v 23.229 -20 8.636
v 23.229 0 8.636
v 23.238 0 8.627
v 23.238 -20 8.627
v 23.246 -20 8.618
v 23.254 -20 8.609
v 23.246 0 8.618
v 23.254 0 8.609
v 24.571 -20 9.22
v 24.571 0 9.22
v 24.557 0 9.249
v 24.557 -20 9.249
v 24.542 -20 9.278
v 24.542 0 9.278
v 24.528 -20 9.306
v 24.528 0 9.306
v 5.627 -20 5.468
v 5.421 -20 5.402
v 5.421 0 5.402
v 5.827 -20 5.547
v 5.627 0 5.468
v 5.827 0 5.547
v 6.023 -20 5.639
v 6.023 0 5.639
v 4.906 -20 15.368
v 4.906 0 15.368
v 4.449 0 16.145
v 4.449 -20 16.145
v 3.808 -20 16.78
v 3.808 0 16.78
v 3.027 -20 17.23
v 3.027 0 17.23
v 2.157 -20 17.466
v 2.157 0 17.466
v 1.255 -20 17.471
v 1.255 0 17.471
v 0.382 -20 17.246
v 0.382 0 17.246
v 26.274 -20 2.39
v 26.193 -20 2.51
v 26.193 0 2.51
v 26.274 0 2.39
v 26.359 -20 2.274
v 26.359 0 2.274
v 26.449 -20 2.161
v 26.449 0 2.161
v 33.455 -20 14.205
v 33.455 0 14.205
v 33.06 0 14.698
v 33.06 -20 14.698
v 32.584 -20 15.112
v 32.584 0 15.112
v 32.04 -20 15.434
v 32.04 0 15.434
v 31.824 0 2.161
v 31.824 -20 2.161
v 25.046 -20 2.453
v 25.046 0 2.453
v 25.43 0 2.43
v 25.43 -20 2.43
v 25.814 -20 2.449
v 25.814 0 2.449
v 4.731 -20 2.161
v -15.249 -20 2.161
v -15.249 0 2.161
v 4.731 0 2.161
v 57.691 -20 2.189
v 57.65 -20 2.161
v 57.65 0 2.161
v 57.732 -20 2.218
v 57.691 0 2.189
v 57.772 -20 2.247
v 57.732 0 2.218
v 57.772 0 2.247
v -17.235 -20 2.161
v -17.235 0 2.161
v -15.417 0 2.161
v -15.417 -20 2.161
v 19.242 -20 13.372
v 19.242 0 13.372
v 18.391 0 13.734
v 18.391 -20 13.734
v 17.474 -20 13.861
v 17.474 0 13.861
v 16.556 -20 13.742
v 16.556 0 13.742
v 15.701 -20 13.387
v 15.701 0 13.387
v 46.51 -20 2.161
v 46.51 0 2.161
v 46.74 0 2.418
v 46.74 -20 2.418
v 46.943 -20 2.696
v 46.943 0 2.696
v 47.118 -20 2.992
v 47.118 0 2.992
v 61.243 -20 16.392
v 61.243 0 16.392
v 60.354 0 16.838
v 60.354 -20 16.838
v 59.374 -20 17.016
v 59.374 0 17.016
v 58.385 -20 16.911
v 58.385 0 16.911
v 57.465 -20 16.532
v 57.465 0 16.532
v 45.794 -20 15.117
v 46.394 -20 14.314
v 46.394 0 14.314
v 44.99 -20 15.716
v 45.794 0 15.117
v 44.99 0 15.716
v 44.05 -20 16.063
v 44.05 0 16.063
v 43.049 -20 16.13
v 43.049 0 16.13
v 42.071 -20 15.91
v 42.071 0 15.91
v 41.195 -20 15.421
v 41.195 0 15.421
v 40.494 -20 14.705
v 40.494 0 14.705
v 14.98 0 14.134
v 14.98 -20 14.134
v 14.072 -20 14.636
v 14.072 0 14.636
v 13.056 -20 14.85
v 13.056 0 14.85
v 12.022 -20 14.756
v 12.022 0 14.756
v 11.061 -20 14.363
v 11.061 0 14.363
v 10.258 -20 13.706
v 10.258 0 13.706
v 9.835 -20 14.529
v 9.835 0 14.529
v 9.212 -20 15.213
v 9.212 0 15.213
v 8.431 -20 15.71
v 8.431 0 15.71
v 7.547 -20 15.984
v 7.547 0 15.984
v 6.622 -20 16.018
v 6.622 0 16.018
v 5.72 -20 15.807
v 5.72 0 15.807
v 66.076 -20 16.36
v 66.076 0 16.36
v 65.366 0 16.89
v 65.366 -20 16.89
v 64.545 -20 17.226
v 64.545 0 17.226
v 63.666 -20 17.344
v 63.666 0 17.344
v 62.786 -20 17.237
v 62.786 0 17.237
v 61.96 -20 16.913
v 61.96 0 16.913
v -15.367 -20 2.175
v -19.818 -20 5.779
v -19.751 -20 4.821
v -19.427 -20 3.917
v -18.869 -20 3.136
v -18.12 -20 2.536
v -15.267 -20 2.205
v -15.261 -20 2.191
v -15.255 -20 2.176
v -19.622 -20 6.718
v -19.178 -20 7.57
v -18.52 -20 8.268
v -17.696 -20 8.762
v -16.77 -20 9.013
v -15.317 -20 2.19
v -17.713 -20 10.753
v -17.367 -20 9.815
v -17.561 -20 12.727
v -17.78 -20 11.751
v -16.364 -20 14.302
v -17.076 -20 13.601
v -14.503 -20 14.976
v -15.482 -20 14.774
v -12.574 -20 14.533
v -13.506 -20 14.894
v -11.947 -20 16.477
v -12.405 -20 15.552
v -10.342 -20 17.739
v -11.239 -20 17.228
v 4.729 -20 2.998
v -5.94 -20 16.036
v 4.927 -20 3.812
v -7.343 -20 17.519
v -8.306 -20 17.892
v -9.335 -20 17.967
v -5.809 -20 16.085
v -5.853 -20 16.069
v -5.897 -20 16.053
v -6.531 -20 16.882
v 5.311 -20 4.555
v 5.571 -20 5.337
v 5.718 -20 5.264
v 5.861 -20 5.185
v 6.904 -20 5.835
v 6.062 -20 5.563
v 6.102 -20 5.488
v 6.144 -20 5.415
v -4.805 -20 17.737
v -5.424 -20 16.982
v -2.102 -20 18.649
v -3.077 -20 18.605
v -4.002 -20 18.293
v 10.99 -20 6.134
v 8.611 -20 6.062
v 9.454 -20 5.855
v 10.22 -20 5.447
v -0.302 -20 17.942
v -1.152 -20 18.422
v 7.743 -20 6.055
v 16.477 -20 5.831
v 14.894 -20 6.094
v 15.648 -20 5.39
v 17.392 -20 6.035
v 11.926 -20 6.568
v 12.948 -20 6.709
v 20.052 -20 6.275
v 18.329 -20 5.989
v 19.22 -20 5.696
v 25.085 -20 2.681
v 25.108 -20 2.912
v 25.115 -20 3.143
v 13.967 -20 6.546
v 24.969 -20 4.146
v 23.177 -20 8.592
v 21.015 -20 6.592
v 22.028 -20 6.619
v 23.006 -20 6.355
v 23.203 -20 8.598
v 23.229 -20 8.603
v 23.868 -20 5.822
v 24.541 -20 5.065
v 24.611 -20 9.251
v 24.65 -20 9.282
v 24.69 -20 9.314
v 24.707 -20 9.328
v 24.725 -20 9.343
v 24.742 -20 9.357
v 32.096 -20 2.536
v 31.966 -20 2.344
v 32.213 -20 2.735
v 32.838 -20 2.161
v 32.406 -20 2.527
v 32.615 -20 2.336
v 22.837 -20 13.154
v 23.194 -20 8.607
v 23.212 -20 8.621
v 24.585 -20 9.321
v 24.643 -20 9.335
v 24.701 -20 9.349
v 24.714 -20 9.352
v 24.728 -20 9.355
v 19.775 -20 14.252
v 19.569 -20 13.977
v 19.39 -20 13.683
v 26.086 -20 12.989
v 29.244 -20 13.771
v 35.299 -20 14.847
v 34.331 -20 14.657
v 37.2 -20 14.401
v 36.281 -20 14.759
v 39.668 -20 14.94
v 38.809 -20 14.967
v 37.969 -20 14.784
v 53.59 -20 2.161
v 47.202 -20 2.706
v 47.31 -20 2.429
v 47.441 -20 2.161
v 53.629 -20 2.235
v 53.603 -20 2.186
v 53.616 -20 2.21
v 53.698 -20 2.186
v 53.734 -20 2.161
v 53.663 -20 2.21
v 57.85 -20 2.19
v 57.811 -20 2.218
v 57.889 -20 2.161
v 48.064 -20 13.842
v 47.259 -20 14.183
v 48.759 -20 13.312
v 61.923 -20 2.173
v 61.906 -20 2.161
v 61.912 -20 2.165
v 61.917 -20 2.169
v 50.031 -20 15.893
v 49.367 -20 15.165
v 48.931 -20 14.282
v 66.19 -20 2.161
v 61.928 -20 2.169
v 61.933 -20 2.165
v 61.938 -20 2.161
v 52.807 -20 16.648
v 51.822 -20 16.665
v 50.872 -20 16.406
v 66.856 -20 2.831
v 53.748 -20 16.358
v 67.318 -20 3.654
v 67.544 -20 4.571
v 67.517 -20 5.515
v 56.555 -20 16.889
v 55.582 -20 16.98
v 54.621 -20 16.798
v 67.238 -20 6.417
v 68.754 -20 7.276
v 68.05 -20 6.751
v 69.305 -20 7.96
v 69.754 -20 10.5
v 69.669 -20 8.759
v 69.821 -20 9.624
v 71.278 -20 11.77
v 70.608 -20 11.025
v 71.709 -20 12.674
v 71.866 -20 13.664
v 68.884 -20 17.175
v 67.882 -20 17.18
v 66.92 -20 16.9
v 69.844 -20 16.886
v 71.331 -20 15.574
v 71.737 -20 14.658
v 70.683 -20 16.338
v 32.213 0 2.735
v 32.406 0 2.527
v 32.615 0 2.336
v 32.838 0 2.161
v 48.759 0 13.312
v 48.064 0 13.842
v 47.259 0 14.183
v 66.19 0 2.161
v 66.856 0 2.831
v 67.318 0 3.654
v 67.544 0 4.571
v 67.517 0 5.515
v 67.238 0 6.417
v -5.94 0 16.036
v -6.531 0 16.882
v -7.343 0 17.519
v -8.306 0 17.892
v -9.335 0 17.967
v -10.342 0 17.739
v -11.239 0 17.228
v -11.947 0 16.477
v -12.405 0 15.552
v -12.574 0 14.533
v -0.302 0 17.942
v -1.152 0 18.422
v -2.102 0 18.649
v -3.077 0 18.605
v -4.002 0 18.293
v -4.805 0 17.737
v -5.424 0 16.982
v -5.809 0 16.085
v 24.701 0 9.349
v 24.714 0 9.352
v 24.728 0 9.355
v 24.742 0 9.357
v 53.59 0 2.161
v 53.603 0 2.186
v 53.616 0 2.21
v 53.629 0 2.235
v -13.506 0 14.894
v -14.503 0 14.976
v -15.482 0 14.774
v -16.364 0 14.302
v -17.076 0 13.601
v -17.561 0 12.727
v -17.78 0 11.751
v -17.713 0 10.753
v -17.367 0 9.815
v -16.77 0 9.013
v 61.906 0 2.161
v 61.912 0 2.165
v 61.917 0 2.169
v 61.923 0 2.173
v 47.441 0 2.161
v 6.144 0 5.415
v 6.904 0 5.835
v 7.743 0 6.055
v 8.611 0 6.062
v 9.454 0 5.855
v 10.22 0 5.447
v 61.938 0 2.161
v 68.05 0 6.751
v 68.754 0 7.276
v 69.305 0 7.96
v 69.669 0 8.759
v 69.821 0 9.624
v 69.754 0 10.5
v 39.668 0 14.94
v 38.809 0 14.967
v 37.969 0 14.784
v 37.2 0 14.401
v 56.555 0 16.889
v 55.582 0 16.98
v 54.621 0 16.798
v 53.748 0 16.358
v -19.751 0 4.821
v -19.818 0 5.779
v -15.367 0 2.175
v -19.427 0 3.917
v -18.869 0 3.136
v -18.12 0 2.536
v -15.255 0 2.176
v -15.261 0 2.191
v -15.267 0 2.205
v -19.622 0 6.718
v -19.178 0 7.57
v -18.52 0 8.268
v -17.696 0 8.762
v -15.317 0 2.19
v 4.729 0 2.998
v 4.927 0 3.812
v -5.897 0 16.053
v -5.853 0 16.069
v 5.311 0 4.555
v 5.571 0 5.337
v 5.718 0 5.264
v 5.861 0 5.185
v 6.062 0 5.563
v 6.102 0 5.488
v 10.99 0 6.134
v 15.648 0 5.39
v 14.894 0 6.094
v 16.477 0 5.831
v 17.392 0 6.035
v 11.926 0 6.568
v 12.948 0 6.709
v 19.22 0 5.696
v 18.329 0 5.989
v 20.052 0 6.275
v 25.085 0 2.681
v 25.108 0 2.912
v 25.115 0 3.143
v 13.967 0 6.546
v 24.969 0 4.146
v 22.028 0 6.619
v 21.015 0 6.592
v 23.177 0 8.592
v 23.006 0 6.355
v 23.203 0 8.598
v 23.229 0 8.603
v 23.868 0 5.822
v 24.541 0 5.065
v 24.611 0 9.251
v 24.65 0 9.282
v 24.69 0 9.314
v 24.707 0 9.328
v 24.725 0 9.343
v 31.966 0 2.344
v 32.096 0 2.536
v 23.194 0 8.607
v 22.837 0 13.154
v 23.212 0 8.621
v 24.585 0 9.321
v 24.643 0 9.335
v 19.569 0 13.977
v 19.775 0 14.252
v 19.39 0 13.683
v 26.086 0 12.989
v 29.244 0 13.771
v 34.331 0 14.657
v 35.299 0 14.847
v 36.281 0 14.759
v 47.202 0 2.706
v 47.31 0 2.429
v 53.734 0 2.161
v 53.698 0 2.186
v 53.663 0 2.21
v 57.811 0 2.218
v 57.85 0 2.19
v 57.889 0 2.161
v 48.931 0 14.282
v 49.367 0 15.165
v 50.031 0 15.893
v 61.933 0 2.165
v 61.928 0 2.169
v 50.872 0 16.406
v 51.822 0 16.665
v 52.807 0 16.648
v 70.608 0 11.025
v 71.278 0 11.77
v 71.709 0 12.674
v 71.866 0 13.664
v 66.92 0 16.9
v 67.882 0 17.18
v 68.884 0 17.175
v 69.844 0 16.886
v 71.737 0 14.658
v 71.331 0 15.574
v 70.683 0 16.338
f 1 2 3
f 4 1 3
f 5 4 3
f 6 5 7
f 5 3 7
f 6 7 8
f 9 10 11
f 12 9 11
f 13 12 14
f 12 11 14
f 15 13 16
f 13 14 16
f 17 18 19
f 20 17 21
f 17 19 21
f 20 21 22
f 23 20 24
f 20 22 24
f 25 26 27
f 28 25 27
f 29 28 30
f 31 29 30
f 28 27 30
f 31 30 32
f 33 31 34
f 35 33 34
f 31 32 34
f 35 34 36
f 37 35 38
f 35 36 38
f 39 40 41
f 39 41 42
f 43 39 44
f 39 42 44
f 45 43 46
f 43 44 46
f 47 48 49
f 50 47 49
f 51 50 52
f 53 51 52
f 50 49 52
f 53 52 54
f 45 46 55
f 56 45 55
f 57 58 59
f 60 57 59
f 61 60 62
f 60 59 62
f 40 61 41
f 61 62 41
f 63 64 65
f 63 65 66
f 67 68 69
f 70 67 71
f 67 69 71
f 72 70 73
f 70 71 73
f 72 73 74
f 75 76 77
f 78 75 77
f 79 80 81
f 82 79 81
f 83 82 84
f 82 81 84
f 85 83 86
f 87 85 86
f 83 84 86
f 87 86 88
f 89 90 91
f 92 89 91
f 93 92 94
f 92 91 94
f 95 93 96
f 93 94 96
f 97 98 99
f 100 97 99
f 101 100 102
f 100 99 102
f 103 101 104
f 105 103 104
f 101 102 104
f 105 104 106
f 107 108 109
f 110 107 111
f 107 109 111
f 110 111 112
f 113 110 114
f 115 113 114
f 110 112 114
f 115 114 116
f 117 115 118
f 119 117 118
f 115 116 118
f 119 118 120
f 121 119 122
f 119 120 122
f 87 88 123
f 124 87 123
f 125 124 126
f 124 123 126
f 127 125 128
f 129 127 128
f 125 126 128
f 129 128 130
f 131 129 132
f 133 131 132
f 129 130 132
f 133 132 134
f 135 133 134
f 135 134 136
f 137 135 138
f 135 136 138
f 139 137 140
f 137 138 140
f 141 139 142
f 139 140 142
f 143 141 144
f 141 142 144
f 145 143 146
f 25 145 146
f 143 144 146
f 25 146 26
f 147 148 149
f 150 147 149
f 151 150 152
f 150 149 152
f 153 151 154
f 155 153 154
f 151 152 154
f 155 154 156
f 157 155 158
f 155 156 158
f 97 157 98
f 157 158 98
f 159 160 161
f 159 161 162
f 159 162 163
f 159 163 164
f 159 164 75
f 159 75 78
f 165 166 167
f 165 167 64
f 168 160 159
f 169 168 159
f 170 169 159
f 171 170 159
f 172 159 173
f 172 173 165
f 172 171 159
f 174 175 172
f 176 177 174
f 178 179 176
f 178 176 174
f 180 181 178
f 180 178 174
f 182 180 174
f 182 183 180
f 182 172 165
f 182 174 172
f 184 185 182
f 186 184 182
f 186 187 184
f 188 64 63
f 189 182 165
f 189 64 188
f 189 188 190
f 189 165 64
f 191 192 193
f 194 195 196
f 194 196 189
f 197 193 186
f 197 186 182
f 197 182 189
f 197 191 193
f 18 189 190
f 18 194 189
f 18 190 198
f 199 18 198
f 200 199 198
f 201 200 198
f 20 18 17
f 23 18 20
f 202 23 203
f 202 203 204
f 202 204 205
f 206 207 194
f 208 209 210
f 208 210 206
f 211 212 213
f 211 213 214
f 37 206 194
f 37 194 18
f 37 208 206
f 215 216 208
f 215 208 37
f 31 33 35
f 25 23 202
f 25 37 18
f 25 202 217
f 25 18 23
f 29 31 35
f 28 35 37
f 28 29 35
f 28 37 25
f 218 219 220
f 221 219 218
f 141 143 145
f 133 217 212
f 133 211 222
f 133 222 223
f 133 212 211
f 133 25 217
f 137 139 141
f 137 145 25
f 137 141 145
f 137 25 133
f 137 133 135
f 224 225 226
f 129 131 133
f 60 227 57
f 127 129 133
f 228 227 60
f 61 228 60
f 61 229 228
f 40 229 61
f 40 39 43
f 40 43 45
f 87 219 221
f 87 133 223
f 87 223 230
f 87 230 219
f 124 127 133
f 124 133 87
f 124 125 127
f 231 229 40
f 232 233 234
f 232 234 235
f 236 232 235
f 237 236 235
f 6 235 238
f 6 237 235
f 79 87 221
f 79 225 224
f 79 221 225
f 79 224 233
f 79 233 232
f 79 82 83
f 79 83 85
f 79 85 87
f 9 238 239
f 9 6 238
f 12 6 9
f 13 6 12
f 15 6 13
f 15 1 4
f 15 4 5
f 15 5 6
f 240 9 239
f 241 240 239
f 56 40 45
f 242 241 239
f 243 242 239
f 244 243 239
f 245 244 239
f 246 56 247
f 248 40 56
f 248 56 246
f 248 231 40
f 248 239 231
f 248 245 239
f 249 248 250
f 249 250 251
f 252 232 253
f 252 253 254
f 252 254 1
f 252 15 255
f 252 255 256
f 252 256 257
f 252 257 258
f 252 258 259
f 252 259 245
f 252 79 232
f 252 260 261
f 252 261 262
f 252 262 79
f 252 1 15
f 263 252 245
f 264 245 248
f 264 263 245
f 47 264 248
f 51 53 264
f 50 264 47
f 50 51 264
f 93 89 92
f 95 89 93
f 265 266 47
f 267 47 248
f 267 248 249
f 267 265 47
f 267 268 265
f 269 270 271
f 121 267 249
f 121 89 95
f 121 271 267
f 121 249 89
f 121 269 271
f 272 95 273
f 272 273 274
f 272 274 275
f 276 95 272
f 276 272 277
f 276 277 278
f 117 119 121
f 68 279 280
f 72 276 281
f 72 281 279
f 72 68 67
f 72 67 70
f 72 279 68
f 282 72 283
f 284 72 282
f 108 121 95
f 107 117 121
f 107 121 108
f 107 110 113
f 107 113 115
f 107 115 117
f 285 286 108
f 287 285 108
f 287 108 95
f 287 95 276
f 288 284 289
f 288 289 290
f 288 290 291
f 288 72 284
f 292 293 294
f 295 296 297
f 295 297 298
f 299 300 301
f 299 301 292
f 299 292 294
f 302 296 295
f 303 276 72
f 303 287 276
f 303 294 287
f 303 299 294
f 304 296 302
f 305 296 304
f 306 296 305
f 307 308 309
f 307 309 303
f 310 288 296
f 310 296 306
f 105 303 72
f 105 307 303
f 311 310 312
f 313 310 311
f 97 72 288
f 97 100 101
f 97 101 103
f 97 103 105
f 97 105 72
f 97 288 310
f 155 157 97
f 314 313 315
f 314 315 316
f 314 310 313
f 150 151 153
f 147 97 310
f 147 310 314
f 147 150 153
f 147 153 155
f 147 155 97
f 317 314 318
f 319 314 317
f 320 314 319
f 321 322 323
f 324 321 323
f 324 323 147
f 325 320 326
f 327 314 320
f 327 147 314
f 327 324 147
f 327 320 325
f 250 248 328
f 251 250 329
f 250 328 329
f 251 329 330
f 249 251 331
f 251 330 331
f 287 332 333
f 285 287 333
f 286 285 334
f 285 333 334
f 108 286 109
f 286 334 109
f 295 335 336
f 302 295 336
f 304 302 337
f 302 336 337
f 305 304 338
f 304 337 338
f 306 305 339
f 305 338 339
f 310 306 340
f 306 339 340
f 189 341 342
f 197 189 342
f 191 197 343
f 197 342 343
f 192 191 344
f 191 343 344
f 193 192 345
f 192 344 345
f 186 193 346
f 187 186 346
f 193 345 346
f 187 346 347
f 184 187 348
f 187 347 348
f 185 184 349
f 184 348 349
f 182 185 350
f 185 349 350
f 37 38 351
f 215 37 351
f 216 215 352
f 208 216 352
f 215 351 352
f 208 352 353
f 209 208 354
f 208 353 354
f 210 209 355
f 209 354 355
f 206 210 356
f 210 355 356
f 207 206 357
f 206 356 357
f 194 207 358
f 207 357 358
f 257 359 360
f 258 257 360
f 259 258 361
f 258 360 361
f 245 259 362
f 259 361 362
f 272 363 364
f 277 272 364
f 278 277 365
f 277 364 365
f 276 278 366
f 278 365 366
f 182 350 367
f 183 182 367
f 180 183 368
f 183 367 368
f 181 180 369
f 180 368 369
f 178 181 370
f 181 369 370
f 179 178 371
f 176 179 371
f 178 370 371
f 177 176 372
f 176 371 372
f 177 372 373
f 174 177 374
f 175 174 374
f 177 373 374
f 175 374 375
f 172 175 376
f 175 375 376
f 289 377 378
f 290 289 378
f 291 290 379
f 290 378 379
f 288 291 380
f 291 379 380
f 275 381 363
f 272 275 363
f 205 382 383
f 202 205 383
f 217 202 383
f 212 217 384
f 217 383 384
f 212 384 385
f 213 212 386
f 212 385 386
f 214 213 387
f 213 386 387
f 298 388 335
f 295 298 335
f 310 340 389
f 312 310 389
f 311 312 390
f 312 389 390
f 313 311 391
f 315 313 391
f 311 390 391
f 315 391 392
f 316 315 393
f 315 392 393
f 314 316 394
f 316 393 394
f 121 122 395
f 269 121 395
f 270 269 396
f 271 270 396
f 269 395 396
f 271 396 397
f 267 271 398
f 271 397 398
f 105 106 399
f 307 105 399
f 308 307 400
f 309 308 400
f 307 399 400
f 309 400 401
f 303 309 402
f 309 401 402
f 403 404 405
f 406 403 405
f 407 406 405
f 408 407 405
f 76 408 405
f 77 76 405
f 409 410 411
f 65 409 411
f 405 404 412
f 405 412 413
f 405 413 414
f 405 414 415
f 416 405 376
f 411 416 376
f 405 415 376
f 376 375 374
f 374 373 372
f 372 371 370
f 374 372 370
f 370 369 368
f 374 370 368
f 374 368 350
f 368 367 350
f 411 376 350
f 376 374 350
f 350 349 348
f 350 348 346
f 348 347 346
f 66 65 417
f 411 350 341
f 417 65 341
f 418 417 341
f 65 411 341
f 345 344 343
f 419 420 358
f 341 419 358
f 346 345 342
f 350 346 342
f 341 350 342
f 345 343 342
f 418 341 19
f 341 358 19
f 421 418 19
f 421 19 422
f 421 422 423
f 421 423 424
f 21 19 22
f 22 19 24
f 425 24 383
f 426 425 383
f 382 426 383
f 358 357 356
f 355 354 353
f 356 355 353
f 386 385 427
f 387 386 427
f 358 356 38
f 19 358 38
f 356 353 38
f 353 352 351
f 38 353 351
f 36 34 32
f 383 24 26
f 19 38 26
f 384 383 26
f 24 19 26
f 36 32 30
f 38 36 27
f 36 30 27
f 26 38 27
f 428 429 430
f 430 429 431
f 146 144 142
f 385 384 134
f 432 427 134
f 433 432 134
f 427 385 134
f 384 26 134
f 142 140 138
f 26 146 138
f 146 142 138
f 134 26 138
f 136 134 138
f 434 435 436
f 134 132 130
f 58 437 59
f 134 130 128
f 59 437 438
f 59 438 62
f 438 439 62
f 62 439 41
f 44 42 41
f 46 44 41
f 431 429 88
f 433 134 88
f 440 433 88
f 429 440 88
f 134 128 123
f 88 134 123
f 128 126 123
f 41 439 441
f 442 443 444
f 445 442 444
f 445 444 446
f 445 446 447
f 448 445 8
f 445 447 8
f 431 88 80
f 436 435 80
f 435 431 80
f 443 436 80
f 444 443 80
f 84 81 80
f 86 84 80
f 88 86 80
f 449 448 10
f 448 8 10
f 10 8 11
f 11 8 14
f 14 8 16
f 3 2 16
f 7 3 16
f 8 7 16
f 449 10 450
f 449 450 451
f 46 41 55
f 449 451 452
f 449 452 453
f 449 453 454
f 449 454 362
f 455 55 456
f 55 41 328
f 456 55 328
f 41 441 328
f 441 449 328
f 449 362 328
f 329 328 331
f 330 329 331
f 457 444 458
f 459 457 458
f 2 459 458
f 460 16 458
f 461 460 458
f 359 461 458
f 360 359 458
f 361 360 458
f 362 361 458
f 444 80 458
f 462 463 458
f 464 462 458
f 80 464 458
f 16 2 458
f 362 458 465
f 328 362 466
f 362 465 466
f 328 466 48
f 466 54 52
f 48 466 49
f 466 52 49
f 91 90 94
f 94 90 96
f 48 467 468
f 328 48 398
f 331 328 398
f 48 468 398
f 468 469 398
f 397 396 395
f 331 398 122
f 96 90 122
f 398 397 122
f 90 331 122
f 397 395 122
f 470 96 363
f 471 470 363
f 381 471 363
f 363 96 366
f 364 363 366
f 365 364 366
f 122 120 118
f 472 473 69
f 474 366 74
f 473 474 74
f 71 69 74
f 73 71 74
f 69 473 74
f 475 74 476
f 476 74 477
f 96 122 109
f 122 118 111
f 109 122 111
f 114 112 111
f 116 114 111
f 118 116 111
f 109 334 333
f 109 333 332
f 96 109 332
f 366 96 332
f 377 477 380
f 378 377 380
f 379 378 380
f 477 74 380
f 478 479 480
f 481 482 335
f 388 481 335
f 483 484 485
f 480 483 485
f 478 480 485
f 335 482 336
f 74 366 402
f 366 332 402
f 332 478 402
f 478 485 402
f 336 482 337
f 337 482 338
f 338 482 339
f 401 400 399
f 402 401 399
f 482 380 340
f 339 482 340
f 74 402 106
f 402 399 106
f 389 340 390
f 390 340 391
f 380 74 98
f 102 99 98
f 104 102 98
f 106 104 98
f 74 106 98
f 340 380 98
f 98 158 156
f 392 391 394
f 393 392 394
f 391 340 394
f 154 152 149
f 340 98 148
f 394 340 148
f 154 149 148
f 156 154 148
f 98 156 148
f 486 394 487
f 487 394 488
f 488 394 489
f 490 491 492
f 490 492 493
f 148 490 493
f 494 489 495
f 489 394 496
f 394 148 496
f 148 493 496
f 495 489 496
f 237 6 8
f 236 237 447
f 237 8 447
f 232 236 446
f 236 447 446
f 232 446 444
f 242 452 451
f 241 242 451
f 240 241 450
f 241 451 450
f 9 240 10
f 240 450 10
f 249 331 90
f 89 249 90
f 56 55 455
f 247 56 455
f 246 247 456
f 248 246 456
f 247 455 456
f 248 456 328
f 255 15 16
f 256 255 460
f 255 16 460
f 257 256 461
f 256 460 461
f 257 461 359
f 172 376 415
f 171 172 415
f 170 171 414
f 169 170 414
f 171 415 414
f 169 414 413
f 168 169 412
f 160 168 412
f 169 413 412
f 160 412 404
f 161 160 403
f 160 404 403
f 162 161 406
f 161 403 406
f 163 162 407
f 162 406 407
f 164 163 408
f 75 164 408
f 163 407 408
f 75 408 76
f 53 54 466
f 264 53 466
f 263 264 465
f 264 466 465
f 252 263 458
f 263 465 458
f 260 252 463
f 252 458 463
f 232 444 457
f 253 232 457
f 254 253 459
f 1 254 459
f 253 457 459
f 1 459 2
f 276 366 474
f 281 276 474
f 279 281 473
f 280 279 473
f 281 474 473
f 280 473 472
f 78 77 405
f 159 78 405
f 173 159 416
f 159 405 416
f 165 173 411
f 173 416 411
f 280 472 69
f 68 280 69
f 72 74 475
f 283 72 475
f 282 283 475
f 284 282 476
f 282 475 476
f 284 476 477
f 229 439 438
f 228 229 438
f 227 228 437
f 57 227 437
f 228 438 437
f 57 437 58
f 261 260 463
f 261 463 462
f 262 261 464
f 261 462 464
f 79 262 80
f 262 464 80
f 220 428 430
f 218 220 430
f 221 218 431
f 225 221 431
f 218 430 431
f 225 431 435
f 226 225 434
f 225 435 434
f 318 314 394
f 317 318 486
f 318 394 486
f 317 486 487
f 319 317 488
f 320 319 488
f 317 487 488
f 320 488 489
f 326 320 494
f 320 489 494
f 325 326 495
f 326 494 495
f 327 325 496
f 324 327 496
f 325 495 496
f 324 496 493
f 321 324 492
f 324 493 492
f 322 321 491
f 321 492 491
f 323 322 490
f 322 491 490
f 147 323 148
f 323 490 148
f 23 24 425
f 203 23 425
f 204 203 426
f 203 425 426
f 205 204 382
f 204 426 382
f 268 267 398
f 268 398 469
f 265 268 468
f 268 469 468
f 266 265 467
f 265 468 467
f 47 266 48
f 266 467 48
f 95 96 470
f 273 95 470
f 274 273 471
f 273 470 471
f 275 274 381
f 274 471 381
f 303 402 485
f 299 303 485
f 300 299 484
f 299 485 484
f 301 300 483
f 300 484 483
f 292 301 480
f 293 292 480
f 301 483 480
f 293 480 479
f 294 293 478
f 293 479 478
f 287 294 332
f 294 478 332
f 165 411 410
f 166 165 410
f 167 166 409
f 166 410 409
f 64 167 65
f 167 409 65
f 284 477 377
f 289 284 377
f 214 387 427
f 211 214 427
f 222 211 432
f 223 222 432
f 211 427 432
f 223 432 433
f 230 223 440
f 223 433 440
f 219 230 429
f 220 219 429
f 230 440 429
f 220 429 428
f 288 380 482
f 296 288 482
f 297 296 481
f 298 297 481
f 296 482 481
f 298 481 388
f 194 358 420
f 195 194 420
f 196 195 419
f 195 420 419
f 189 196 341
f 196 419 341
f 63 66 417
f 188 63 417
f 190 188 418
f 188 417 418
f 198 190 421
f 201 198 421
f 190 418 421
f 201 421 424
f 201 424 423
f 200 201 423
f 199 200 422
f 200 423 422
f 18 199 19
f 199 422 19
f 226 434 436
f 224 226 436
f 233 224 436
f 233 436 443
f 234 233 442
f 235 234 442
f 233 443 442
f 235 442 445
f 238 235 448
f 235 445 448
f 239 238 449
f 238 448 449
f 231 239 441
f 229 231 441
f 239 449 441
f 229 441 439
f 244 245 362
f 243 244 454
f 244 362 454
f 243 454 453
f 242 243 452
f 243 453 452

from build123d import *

# Parameters (mm, degrees)
F1_DEPTH = 20


with BuildPart() as f1:
    # F0 (on Front) → F1 (new body)
    with BuildSketch(Plane.XZ):
        with BuildLine():
            ThreePointArc((-5.940089, 16.035642), (-9.847151, 17.890695), (-12.573514, 14.533122))
            ThreePointArc((-12.573514, 14.533122), (-17.076209, 13.600936), (-16.769733, 9.012985))
            ThreePointArc((-16.769733, 9.012985), (-19.818074, 5.778568), (-17.235455, 2.161398))
            Line((-17.235455, 2.161398), (-15.416807, 2.161398))
            ThreePointArc((-15.416807, 2.161398), (-15.341632, 2.182526), (-15.266946, 2.205325))
            ThreePointArc((-15.266946, 2.205325), (-15.257997, 2.183331), (-15.248898, 2.161398))
            Line((-15.248898, 2.161398), (0.599075, 2.161398))
            Line((0.599075, 2.161398), (1.466817, 2.161398))
            Line((1.466817, 2.161398), (2.837026, 2.161398))
            Line((2.837026, 2.161398), (4.730743, 2.161398))
            ThreePointArc((4.730743, 2.161398), (4.926621, 3.811509), (5.861452, 5.185307))
            ThreePointArc((5.861452, 5.185307), (5.64524, 5.301362), (5.421428, 5.401982))
            ThreePointArc((5.421428, 5.401982), (5.727707, 5.506425), (6.023032, 5.638709))
            ThreePointArc((6.023032, 5.638709), (6.081628, 5.525636), (6.1443, 5.41477))
            ThreePointArc((6.1443, 5.41477), (8.177085, 6.085562), (10.220286, 5.447202))
            ThreePointArc((10.220286, 5.447202), (12.947827, 6.708886), (15.648336, 5.390333))
            ThreePointArc((15.648336, 5.390333), (17.392275, 6.035167), (19.220387, 5.695841))
            ThreePointArc((19.220387, 5.695841), (23.005934, 6.355332), (25.115261, 3.143474))
            ThreePointArc((25.115261, 3.143474), (25.098006, 2.796362), (25.046411, 2.452672))
            ThreePointArc((25.046411, 2.452672), (25.622278, 2.433805), (26.193437, 2.509672))
            ThreePointArc((26.193437, 2.509672), (26.316013, 2.331581), (26.449351, 2.161398))
            Line((26.449351, 2.161398), (31.823543, 2.161398))
            ThreePointArc((31.823543, 2.161398), (32.032567, 2.438734), (32.213077, 2.735419))
            ThreePointArc((32.213077, 2.735419), (32.508273, 2.429381), (32.838403, 2.161398))
            Line((32.838403, 2.161398), (36.281702, 2.161398))
            Line((36.281702, 2.161398), (36.911824, 2.161398))
            Line((36.911824, 2.161398), (46.510172, 2.161398))
            ThreePointArc((46.510172, 2.161398), (46.844985, 2.554338), (47.118356, 2.992253))
            ThreePointArc((47.118356, 2.992253), (47.25325, 2.566504), (47.441262, 2.161398))
            Line((47.441262, 2.161398), (53.58981, 2.161398))
            ThreePointArc((53.58981, 2.161398), (53.609488, 2.198076), (53.628728, 2.234985))
            ThreePointArc((53.628728, 2.234985), (53.6808, 2.197712), (53.733544, 2.161398))
            Line((53.733544, 2.161398), (57.650192, 2.161398))
            ThreePointArc((57.650192, 2.161398), (57.711534, 2.203767), (57.771959, 2.247433))
            ThreePointArc((57.771959, 2.247433), (57.830262, 2.203804), (57.889461, 2.161398))
            Line((57.889461, 2.161398), (61.906458, 2.161398))
            ThreePointArc((61.906458, 2.161398), (61.914706, 2.167195), (61.922937, 2.173016))
            ThreePointArc((61.922937, 2.173016), (61.930484, 2.167197), (61.938047, 2.161398))
            Line((61.938047, 2.161398), (66.189721, 2.161398))
            ThreePointArc((66.189721, 2.161398), (67.462375, 4.105018), (67.237666, 6.417336))
            ThreePointArc((67.237666, 6.417336), (69.30512, 7.959865), (69.754252, 10.499952))
            ThreePointArc((69.754252, 10.499952), (71.331241, 15.573923), (66.076262, 16.359591))
            ThreePointArc((66.076262, 16.359591), (63.666049, 17.343961), (61.242942, 16.391769))
            ThreePointArc((61.242942, 16.391769), (59.374481, 17.015844), (57.464914, 16.531934))
            ThreePointArc((57.464914, 16.531934), (55.581553, 16.979922), (53.748163, 16.358292))
            ThreePointArc((53.748163, 16.358292), (50.433059, 16.178923), (48.759147, 13.31185))
            ThreePointArc((48.759147, 13.31185), (47.671864, 14.037602), (46.394121, 14.313776))
            ThreePointArc((46.394121, 14.313776), (43.551728, 16.132472), (40.494129, 14.704908))
            ThreePointArc((40.494129, 14.704908), (38.808881, 14.966861), (37.19991, 14.401271))
            ThreePointArc((37.19991, 14.401271), (35.298822, 14.847046), (33.454766, 14.204929))
            ThreePointArc((33.454766, 14.204929), (32.831306, 14.915761), (32.040328, 15.433774))
            ThreePointArc((32.040328, 15.433774), (26.086101, 12.988903), (19.774679, 14.252293))
            ThreePointArc((19.774679, 14.252293), (19.47591, 13.831908), (19.242162, 13.372182))
            ThreePointArc((19.242162, 13.372182), (17.473764, 13.860622), (15.70123, 13.387412))
            ThreePointArc((15.70123, 13.387412), (13.055743, 14.849641), (10.257811, 13.705836))
            ThreePointArc((10.257811, 13.705836), (7.997811, 15.876464), (4.905806, 15.367808))
            ThreePointArc((4.905806, 15.367808), (3.027117, 17.230013), (0.381927, 17.24577))
            ThreePointArc((0.381927, 17.24577), (-3.077319, 18.604807), (-5.809141, 16.084784))
            ThreePointArc((-5.809141, 16.084784), (-5.874893, 16.060954), (-5.940089, 16.035642))
        make_face()
        with BuildLine():
            ThreePointArc((23.254268, 8.608952), (23.215618, 8.600301), (23.176873, 8.592087))
            ThreePointArc((23.176873, 8.592087), (23.203012, 8.614169), (23.229366, 8.635994))
            ThreePointArc((23.229366, 8.635994), (23.241782, 8.62244), (23.254268, 8.608952))
        make_face(mode=Mode.SUBTRACT)
        with BuildLine():
            ThreePointArc((24.700602, 9.348636), (24.721351, 9.353109), (24.742126, 9.357456))
            ThreePointArc((24.742126, 9.357456), (24.715987, 9.335374), (24.689633, 9.313549))
            ThreePointArc((24.689633, 9.313549), (24.630678, 9.266264), (24.570715, 9.220262))
            ThreePointArc((24.570715, 9.220262), (24.549477, 9.263361), (24.52765, 9.306164))
            ThreePointArc((24.52765, 9.306164), (24.613856, 9.3285), (24.700602, 9.348636))
        make_face(mode=Mode.SUBTRACT)
    extrude(amount=F1_DEPTH)


solid = f1.part
